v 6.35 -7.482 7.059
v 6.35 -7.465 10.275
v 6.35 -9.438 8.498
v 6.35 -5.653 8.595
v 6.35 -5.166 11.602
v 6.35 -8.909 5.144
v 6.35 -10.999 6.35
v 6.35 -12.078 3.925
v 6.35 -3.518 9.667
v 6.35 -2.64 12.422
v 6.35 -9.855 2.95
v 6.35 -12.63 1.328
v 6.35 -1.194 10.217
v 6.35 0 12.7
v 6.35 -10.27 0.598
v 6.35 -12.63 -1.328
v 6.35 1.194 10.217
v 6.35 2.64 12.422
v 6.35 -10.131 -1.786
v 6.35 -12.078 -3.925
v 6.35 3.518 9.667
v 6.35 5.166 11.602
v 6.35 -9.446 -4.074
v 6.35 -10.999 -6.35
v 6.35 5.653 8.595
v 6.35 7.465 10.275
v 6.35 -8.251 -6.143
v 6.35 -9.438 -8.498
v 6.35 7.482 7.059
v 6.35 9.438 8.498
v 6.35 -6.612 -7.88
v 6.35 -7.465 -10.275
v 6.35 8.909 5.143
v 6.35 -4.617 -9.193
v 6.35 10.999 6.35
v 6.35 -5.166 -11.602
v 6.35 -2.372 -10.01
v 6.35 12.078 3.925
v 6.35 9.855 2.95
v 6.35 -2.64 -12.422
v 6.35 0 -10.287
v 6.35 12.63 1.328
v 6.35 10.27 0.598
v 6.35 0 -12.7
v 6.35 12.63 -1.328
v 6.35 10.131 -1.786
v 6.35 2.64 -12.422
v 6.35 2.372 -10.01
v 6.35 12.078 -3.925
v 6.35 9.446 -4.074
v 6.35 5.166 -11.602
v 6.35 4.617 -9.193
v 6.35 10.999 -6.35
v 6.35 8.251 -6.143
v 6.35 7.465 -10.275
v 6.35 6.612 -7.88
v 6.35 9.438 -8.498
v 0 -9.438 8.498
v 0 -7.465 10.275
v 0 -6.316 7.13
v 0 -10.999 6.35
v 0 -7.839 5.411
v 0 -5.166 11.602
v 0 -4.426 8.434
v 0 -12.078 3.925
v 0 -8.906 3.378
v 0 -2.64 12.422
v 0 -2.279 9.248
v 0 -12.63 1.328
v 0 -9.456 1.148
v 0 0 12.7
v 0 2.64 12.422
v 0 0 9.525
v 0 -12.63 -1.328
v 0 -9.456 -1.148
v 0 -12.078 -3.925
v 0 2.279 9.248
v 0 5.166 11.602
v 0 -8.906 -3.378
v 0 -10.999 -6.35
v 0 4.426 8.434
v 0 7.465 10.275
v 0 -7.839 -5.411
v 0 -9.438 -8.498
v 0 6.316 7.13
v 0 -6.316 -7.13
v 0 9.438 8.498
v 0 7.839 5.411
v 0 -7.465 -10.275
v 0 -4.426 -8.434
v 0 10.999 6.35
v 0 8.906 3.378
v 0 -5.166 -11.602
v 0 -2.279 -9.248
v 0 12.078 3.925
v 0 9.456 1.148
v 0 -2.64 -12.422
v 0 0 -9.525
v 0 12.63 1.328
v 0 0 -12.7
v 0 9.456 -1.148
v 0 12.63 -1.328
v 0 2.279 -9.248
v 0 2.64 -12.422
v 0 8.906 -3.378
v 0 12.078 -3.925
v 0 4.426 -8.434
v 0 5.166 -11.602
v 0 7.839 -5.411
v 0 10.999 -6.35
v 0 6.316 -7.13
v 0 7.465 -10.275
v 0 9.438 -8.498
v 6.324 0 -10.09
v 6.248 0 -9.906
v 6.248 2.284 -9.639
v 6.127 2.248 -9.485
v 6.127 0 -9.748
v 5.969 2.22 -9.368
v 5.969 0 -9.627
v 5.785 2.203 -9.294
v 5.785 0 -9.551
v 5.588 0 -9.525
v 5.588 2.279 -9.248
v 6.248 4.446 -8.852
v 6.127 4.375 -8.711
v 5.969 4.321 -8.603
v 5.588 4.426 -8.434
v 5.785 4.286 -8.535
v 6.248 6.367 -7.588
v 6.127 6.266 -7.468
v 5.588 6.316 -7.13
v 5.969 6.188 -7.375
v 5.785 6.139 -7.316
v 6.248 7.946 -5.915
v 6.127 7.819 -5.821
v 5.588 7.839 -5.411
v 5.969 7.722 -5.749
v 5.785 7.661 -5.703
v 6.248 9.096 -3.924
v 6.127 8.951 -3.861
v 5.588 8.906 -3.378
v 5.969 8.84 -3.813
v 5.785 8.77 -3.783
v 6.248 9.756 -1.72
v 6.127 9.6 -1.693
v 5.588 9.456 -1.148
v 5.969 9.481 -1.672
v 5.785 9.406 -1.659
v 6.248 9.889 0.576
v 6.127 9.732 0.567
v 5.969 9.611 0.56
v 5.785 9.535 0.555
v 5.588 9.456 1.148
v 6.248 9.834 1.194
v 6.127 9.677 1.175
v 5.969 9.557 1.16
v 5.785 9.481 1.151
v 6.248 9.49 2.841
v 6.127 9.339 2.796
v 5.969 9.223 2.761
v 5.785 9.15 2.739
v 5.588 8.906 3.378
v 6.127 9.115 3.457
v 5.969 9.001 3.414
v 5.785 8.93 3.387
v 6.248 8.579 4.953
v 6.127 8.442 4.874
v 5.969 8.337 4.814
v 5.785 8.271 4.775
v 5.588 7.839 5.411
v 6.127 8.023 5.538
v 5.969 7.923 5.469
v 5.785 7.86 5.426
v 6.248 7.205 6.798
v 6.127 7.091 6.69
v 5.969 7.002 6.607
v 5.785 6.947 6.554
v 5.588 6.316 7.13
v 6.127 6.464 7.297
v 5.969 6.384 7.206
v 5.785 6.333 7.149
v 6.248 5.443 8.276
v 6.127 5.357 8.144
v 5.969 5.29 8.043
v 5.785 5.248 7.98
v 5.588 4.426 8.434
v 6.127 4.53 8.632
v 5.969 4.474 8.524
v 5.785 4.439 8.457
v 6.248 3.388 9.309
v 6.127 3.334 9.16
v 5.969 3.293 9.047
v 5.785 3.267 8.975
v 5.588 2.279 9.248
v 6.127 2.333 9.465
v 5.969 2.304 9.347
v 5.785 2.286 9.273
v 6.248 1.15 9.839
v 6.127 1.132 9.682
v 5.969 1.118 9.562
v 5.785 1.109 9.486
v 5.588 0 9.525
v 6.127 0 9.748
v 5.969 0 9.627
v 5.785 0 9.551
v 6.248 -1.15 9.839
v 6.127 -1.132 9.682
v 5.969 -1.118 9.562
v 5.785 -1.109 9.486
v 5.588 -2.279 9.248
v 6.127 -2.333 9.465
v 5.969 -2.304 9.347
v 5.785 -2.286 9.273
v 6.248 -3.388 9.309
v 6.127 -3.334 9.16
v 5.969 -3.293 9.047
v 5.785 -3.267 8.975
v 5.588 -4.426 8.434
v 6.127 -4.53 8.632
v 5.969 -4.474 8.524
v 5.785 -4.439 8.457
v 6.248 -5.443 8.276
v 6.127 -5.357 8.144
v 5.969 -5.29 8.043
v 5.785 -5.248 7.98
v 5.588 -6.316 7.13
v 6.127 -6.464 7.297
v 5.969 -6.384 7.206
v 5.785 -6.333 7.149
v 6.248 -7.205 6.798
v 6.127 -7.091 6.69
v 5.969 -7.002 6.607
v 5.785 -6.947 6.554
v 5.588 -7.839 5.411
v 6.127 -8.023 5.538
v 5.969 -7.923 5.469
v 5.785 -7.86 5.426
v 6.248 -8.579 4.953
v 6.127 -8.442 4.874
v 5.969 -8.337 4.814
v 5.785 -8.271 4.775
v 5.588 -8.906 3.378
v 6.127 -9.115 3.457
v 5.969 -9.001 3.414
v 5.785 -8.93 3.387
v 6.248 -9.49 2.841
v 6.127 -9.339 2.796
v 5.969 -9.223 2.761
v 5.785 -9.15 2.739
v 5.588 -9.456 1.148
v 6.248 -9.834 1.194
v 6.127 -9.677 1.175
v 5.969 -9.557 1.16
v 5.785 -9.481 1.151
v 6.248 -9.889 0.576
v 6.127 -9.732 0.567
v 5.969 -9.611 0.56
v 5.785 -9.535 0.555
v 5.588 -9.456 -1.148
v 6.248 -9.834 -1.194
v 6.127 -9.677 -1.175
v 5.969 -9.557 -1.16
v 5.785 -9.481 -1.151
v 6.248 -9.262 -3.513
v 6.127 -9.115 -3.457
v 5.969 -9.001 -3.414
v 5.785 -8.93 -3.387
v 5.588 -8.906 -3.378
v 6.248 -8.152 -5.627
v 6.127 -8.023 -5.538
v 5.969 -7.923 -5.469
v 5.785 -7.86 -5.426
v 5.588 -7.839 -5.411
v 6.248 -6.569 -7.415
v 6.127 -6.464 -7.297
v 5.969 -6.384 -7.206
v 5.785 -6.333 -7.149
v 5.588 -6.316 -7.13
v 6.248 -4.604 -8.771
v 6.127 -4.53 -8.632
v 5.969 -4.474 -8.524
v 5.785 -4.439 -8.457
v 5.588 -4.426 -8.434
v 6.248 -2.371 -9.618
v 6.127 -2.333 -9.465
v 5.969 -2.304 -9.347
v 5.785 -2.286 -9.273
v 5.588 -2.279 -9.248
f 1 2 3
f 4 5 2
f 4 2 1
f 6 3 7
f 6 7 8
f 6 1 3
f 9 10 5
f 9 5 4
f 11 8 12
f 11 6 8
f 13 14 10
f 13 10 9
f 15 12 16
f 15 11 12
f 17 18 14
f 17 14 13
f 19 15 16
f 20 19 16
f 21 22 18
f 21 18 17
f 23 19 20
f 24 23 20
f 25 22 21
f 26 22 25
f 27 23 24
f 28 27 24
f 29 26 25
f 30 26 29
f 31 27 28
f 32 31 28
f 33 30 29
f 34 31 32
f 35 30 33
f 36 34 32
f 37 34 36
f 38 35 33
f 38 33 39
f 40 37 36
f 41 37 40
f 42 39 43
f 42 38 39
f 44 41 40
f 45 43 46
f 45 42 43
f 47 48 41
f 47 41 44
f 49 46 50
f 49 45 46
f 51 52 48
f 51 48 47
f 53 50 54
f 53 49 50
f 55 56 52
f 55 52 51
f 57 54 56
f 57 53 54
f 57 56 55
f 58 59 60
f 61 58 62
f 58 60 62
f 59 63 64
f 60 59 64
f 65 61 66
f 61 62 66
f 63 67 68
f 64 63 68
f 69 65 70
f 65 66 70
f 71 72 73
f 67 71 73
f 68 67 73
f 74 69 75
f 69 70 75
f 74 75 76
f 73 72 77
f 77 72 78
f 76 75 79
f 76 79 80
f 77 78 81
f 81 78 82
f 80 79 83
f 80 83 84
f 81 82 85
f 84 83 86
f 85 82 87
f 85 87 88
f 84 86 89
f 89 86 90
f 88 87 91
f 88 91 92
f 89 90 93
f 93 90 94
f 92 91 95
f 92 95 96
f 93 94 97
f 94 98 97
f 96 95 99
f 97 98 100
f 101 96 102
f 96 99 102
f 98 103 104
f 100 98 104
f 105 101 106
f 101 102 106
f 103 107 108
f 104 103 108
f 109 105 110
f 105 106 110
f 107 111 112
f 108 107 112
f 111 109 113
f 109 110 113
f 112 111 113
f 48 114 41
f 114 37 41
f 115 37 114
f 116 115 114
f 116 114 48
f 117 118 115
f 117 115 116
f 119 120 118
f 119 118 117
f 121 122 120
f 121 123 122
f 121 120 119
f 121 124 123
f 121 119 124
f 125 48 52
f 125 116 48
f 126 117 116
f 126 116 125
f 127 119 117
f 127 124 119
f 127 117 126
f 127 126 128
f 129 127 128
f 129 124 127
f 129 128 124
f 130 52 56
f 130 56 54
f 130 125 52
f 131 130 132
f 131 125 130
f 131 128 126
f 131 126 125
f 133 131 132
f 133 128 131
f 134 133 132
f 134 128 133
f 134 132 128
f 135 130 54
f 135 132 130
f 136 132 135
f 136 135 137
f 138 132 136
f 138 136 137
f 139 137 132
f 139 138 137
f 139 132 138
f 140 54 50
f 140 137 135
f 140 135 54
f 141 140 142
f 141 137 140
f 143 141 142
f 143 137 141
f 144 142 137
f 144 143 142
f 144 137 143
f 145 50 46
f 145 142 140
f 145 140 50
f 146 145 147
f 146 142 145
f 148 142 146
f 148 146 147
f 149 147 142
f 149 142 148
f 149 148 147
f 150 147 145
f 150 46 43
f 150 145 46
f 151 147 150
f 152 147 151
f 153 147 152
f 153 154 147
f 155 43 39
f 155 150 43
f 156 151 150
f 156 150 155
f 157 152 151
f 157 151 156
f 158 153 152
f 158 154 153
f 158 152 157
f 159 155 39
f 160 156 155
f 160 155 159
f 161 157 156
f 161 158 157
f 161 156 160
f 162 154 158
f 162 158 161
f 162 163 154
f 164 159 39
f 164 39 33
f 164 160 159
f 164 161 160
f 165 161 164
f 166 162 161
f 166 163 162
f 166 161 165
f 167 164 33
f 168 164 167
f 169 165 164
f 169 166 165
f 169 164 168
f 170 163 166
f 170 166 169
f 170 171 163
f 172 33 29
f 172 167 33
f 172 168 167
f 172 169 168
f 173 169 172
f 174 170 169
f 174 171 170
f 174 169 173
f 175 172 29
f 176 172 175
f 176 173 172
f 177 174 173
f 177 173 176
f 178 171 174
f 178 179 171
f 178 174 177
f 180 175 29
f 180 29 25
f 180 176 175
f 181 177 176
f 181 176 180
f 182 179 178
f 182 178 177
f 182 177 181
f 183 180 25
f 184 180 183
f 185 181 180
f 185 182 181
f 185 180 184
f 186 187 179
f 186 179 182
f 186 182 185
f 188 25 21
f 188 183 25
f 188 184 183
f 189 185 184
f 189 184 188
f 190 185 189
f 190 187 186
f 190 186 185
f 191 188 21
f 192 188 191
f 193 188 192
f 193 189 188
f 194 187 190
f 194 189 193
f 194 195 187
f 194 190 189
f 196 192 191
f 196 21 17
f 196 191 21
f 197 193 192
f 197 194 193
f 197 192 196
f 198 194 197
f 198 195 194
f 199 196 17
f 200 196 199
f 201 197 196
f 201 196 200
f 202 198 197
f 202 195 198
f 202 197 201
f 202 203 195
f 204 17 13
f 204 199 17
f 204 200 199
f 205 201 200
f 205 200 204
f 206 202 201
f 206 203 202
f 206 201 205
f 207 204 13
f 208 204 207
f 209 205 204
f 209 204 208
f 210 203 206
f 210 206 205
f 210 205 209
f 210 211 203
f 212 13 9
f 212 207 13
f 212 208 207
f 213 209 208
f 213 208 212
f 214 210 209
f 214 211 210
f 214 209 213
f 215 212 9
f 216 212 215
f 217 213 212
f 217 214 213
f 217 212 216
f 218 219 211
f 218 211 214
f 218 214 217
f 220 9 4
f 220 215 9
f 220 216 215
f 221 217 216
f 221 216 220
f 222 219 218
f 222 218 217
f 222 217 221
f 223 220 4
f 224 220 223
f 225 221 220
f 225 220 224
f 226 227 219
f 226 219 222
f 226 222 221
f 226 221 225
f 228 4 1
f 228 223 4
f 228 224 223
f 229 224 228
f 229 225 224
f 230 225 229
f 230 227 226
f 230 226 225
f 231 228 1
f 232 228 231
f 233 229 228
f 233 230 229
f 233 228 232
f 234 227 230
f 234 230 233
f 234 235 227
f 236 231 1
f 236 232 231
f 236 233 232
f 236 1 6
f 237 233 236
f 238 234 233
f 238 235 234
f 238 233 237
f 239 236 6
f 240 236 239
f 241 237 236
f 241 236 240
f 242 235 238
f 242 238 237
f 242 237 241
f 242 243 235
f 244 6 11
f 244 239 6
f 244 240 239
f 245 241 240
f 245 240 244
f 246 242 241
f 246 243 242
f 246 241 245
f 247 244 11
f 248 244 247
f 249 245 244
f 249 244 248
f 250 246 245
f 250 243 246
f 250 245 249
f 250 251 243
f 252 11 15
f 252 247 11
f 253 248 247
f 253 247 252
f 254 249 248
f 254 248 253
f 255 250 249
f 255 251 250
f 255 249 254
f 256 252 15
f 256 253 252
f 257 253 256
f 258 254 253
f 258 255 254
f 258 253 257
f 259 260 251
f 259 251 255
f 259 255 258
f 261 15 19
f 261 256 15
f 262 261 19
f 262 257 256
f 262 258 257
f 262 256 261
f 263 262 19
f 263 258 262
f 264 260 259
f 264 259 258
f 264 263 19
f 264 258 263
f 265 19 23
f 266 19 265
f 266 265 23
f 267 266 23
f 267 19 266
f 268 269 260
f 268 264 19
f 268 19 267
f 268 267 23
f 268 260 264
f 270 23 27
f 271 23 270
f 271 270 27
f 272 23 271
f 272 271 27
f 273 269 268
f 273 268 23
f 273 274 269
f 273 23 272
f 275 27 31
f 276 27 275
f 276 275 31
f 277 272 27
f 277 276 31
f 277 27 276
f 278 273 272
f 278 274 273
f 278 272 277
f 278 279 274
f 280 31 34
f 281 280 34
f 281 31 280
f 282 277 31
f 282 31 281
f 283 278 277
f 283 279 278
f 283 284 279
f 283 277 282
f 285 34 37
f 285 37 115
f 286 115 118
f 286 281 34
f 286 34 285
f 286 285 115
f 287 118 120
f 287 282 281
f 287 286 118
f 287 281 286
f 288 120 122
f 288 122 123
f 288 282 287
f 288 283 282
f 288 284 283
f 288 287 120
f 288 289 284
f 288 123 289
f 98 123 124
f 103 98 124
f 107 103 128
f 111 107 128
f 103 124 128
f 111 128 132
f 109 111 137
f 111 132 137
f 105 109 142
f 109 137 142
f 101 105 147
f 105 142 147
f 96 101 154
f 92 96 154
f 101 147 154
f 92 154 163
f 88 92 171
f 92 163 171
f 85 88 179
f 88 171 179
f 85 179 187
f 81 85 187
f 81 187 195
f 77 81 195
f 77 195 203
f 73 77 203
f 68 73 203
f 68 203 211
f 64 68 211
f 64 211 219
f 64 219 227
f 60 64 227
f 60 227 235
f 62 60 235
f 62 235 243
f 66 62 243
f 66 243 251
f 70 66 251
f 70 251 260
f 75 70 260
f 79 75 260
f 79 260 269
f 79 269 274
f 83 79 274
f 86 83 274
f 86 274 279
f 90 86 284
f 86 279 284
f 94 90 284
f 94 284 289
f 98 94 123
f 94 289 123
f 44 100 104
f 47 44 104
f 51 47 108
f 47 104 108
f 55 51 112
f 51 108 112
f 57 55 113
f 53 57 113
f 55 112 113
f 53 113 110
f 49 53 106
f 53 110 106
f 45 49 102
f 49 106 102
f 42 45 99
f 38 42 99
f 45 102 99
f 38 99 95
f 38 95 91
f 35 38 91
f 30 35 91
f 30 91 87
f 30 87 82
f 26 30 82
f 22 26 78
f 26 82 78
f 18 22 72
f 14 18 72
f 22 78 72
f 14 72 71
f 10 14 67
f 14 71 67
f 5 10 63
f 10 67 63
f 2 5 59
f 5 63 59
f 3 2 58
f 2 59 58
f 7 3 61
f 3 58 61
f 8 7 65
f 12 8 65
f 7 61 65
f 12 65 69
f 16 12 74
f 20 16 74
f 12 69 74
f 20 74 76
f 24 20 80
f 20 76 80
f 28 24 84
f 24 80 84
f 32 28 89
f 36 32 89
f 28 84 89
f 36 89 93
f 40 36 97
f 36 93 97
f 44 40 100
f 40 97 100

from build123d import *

# Parameters (mm, degrees)
SKETCH1_R           = 12.7
BOSS_EXTRUDE1_DEPTH = 6.35
CUT_EXTRUDE1_REACH  = 21.05
SKETCH2_R           = 9.525
FILLET1_R           = 0.762


with BuildPart() as part:
    # Sketch1 → Boss-Extrude1 (new body)
    with BuildSketch(Plane(origin=(0, 0, 0), x_dir=(0, 0, -1), z_dir=(1, 0, 0))):
        Circle(SKETCH1_R)
    extrude(amount=BOSS_EXTRUDE1_DEPTH)

    # Sketch2 → Cut-Extrude1 (cut, up to next)
    with BuildSketch(Plane(origin=(6.35, 0, 0), x_dir=(0, 0, -1), z_dir=(1, 0, 0)), mode=Mode.PRIVATE) as cut_extrude1_sk1:
        Circle(SKETCH2_R)
    cut_extrude1_tool1 = extrude(cut_extrude1_sk1.sketch, amount=-CUT_EXTRUDE1_REACH, mode=Mode.PRIVATE) & part.part
    add(cut_extrude1_tool1.solids().sort_by_distance((6.35, 0, 0))[0], mode=Mode.SUBTRACT)

    # Fillet1
    fillet1_edges = [part.edges().sort_by_distance(p)[0] for p in [
        (6.35, 0, 9.525),
    ]]
    fillet(fillet1_edges, radius=FILLET1_R)


solid = part.part
